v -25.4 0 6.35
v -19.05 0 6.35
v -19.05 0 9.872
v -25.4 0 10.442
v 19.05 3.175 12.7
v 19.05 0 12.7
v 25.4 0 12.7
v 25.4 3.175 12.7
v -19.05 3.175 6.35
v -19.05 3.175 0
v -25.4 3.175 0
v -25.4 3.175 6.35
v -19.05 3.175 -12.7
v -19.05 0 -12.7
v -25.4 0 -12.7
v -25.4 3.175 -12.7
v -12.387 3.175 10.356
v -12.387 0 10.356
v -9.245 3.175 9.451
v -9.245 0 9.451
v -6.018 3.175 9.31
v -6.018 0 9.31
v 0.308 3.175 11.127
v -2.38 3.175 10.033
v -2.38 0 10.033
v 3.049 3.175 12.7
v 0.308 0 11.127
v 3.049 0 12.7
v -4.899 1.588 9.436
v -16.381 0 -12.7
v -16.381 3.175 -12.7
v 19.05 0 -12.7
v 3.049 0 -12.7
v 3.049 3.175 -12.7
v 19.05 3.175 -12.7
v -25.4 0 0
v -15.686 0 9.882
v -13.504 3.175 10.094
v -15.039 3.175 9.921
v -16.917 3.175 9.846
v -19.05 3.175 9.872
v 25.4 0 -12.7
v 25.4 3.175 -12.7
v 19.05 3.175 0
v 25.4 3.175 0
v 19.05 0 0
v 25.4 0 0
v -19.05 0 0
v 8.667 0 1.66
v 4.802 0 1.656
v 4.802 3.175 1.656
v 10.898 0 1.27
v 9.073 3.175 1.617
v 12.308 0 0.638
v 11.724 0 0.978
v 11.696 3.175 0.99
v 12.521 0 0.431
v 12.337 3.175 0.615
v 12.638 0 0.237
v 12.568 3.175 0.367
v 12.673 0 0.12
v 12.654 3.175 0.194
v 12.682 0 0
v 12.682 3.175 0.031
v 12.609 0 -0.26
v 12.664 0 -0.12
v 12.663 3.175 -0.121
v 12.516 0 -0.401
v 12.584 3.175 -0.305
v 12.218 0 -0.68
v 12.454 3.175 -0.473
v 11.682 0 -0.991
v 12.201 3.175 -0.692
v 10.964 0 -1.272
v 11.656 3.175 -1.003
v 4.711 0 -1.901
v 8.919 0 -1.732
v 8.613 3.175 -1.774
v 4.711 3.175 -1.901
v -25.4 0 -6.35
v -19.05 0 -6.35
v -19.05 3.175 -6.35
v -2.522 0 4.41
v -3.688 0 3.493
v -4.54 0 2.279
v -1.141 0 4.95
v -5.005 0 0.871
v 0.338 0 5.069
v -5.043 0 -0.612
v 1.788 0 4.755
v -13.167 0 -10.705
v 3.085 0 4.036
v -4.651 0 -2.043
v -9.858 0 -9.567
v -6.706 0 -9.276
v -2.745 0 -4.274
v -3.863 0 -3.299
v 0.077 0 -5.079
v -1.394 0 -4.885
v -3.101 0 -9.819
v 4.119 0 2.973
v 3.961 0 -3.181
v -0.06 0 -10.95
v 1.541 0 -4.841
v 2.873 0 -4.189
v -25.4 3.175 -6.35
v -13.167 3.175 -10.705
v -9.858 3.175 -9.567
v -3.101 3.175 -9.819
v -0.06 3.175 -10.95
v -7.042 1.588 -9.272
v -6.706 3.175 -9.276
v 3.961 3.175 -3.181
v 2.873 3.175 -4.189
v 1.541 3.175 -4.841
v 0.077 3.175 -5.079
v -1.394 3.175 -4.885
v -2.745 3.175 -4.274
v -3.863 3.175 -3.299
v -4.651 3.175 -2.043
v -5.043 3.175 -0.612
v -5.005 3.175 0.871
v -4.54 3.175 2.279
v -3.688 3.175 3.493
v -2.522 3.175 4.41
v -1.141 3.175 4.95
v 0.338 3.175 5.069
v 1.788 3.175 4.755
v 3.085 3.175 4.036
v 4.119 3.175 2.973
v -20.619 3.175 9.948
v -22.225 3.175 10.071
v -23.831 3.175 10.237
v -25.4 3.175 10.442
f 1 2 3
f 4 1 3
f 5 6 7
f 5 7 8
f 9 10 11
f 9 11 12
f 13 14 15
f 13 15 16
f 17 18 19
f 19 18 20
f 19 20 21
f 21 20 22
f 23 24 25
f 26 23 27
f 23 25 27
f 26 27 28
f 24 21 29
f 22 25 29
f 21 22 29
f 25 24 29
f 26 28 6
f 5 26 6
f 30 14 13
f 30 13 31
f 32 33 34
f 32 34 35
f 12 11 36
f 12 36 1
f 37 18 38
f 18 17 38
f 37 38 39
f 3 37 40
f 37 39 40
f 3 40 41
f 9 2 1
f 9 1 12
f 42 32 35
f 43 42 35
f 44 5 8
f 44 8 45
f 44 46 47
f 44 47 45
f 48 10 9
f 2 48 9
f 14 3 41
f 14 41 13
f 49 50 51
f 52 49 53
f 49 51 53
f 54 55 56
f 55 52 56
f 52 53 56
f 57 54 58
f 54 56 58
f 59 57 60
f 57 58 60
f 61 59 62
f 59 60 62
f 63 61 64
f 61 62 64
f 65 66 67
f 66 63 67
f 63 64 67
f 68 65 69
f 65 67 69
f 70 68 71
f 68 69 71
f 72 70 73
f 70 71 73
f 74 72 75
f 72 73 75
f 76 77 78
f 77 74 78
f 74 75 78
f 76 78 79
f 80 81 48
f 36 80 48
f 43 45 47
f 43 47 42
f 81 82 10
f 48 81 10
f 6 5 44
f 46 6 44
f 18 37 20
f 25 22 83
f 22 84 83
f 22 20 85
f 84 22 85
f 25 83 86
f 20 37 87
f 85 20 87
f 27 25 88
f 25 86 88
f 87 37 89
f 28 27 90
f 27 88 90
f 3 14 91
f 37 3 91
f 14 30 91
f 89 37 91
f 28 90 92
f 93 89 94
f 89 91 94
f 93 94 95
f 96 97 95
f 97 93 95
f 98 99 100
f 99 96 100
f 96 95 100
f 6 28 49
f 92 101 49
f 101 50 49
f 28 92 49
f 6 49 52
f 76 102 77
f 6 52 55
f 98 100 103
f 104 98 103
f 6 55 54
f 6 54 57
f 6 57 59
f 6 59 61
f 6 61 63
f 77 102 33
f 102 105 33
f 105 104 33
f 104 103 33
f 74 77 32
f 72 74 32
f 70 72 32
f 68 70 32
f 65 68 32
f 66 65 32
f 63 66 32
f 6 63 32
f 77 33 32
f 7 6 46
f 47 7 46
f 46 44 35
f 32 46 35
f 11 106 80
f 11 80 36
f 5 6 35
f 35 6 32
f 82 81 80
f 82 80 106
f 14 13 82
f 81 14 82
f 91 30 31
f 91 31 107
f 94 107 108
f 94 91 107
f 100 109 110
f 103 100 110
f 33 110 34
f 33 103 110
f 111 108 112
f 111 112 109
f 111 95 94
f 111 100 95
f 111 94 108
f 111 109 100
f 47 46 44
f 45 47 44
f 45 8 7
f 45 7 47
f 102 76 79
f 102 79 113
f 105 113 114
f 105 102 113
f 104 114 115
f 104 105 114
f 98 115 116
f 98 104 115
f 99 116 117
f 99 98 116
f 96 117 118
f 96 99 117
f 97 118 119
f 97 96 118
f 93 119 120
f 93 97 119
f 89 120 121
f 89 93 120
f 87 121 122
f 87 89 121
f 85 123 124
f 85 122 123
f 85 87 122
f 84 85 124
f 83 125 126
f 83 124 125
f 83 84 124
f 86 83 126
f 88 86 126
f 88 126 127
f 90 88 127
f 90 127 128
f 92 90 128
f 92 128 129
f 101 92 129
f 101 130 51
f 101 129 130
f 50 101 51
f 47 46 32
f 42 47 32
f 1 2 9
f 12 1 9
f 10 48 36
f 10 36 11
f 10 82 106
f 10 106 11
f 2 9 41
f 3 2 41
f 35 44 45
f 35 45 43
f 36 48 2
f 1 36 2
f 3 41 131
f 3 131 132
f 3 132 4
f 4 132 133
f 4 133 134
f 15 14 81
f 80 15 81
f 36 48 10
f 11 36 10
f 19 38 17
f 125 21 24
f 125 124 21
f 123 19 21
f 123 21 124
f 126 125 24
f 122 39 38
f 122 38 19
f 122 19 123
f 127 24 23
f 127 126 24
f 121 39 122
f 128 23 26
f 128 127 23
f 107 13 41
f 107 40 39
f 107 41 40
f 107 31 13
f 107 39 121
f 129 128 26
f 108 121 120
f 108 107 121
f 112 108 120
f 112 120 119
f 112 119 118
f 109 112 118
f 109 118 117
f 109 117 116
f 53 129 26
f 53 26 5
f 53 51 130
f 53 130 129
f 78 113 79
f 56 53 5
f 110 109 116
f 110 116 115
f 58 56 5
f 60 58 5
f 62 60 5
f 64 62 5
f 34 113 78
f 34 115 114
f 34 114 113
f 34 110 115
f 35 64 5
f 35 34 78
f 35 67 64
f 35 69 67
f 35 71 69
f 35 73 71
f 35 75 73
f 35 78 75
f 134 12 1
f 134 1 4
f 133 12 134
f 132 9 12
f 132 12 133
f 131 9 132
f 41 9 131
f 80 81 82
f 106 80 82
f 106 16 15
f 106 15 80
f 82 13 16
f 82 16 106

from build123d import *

# Parameters (mm, degrees)
SKETCH1_W           = 38.1
SKETCH1_H           = 25.4
SKETCH1_R           = 5.08
BOSS_EXTRUDE1_DEPTH = 3.175
SKETCH2_W           = 6.35
SKETCH2_H           = 3.175
BOSS_EXTRUDE3_DEPTH = 6.35
SKETCH2_4_W         = 6.35
SKETCH2_4_H         = 3.175
BOSS_EXTRUDE4_DEPTH = 6.35
SKETCH2_6_W         = 6.35
SKETCH2_6_H         = 3.175
BOSS_EXTRUDE6_DEPTH = 6.35
SKETCH2_7_W         = 6.35
SKETCH2_7_H         = 3.175
BOSS_EXTRUDE7_DEPTH = 6.35
SKETCH4_W           = 12.7
SKETCH4_H           = 3.175
BOSS_EXTRUDE8_DEPTH = 6.35
SKETCH4_3_W         = 12.7
SKETCH4_3_H         = 3.175
BOSS_EXTRUDE9_DEPTH = 6.35
CUT_EXTRUDE2_START  = -3.175
CUT_EXTRUDE2_DEPTH  = 3.175
SKETCH8_RX          = 10.678619867
SKETCH8_RY          = 1.879818627
CUT_EXTRUDE3_DEPTH  = 29.575000056
SKETCH9_RX          = 6.310379454
SKETCH9_RY          = 1.838996288
CUT_EXTRUDE4_DEPTH  = 29.575000211


# Read off the part's stored shape, not the designer's step: Cut-Extrude2
with BuildPart() as part:
    # Sketch1 → Boss-Extrude1 (new body)
    with BuildSketch(Plane(origin=(0, 0, 0), x_dir=(1, 0, 0), z_dir=(0, 1, 0))):
        Rectangle(SKETCH1_W, SKETCH1_H)
        with Locations(Location((0, 0, 0), (0, 0, 270))):
            Circle(SKETCH1_R, mode=Mode.SUBTRACT)
    extrude(amount=BOSS_EXTRUDE1_DEPTH)

    # Cut-Extrude2 outline → Cut-Extrude2 (cut)
    with BuildSketch(Plane(origin=(0, 3.175, 0), x_dir=(1, 0, 0), z_dir=(0, 1, 0)).offset(CUT_EXTRUDE2_START)):
        with BuildLine():
            add(Edge.make_bspline(
                [(-16.381459426, -12.7), (-7.418069757, -5.843770377), (3.048928821, -12.7)],
                knots=[0, 0, 0, 1, 1, 1], degree=2))
            Line((-16.381459426, -12.7), (3.048928821, -12.7))
        make_face()
    cut_extrude2 = extrude(amount=CUT_EXTRUDE2_DEPTH, mode=Mode.SUBTRACT)

    # Mirror1: Cut-Extrude2 across plane
    add(cut_extrude2.mirror(Plane.XY), mode=Mode.SUBTRACT)


with BuildPart() as body_2:
    # Sketch2 → Boss-Extrude3 (new body)
    with BuildSketch(Plane.ZY.offset(19.05)):
        with Locations((-9.525, 1.5875)):
            Rectangle(SKETCH2_W, SKETCH2_H)
    extrude(amount=BOSS_EXTRUDE3_DEPTH)


with BuildPart() as body_3:
    # Sketch2<4> → Boss-Extrude4 (new body)
    with BuildSketch(Plane.ZY.offset(19.05)):
        with Locations((-3.175, 1.5875)):
            Rectangle(SKETCH2_4_W, SKETCH2_4_H)
    extrude(amount=BOSS_EXTRUDE4_DEPTH)


with BuildPart() as body_4:
    # Sketch2<6> → Boss-Extrude6 (new body)
    with BuildSketch(Plane.ZY.offset(19.05)):
        with Locations((3.175, 1.5875)):
            Rectangle(SKETCH2_6_W, SKETCH2_6_H)
    extrude(amount=BOSS_EXTRUDE6_DEPTH)


with BuildPart() as body_5:
    # Sketch2<7> → Boss-Extrude7 (new body)
    with BuildSketch(Plane.ZY.offset(19.05)):
        with Locations((9.525, 1.5875)):
            Rectangle(SKETCH2_7_W, SKETCH2_7_H)
    extrude(amount=BOSS_EXTRUDE7_DEPTH)


with BuildPart() as body_6:
    # Sketch4 → Boss-Extrude8 (new body)
    with BuildSketch(Plane(origin=(19.05, 0, 0), x_dir=(0, 0, -1), z_dir=(1, 0, 0))):
        with Locations((-6.35, 1.5875)):
            Rectangle(SKETCH4_W, SKETCH4_H)
    extrude(amount=BOSS_EXTRUDE8_DEPTH)


with BuildPart() as body_7:
    # Sketch4<3> → Boss-Extrude9 (new body)
    with BuildSketch(Plane(origin=(19.05, 0, 0), x_dir=(0, 0, -1), z_dir=(1, 0, 0))):
        with Locations((6.35, 1.5875)):
            Rectangle(SKETCH4_3_W, SKETCH4_3_H)
    extrude(amount=BOSS_EXTRUDE9_DEPTH)


with BuildPart() as cut_extrude3_tool:
    # Sketch8 → Cut-Extrude3 (new, through all)
    with BuildSketch(Plane(origin=(0, 3.175, 0), x_dir=(1, 0, 0), z_dir=(0, 1, 0))):
        with Locations(Location((-22.219604707, -11.957904728), (0, 0, 5.292695502))):
            Ellipse(SKETCH8_RX, SKETCH8_RY)
    extrude(amount=-CUT_EXTRUDE3_DEPTH)


with BuildPart() as part_1:
    add(part.part)

    # Cut-Extrude3: cut by cut_extrude3_tool
    add(cut_extrude3_tool.part, mode=Mode.SUBTRACT)

    # Sketch9 → Cut-Extrude4 (cut, through all)
    with BuildSketch(Plane(origin=(0, 3.175, 0), x_dir=(1, 0, 0), z_dir=(0, 1, 0))):
        with Locations(Location((6.373000309, 0.095873626), (0, 0, 178.839260522))):
            Ellipse(SKETCH9_RX, SKETCH9_RY)
    extrude(amount=-CUT_EXTRUDE4_DEPTH, mode=Mode.SUBTRACT)


with BuildPart() as body_5_1:
    add(body_5.part)

    # Cut-Extrude3: cut by cut_extrude3_tool
    add(cut_extrude3_tool.part, mode=Mode.SUBTRACT)


solid = Compound([body_2.part, body_3.part, body_4.part, body_6.part, body_7.part, part_1.part, body_5_1.part])
